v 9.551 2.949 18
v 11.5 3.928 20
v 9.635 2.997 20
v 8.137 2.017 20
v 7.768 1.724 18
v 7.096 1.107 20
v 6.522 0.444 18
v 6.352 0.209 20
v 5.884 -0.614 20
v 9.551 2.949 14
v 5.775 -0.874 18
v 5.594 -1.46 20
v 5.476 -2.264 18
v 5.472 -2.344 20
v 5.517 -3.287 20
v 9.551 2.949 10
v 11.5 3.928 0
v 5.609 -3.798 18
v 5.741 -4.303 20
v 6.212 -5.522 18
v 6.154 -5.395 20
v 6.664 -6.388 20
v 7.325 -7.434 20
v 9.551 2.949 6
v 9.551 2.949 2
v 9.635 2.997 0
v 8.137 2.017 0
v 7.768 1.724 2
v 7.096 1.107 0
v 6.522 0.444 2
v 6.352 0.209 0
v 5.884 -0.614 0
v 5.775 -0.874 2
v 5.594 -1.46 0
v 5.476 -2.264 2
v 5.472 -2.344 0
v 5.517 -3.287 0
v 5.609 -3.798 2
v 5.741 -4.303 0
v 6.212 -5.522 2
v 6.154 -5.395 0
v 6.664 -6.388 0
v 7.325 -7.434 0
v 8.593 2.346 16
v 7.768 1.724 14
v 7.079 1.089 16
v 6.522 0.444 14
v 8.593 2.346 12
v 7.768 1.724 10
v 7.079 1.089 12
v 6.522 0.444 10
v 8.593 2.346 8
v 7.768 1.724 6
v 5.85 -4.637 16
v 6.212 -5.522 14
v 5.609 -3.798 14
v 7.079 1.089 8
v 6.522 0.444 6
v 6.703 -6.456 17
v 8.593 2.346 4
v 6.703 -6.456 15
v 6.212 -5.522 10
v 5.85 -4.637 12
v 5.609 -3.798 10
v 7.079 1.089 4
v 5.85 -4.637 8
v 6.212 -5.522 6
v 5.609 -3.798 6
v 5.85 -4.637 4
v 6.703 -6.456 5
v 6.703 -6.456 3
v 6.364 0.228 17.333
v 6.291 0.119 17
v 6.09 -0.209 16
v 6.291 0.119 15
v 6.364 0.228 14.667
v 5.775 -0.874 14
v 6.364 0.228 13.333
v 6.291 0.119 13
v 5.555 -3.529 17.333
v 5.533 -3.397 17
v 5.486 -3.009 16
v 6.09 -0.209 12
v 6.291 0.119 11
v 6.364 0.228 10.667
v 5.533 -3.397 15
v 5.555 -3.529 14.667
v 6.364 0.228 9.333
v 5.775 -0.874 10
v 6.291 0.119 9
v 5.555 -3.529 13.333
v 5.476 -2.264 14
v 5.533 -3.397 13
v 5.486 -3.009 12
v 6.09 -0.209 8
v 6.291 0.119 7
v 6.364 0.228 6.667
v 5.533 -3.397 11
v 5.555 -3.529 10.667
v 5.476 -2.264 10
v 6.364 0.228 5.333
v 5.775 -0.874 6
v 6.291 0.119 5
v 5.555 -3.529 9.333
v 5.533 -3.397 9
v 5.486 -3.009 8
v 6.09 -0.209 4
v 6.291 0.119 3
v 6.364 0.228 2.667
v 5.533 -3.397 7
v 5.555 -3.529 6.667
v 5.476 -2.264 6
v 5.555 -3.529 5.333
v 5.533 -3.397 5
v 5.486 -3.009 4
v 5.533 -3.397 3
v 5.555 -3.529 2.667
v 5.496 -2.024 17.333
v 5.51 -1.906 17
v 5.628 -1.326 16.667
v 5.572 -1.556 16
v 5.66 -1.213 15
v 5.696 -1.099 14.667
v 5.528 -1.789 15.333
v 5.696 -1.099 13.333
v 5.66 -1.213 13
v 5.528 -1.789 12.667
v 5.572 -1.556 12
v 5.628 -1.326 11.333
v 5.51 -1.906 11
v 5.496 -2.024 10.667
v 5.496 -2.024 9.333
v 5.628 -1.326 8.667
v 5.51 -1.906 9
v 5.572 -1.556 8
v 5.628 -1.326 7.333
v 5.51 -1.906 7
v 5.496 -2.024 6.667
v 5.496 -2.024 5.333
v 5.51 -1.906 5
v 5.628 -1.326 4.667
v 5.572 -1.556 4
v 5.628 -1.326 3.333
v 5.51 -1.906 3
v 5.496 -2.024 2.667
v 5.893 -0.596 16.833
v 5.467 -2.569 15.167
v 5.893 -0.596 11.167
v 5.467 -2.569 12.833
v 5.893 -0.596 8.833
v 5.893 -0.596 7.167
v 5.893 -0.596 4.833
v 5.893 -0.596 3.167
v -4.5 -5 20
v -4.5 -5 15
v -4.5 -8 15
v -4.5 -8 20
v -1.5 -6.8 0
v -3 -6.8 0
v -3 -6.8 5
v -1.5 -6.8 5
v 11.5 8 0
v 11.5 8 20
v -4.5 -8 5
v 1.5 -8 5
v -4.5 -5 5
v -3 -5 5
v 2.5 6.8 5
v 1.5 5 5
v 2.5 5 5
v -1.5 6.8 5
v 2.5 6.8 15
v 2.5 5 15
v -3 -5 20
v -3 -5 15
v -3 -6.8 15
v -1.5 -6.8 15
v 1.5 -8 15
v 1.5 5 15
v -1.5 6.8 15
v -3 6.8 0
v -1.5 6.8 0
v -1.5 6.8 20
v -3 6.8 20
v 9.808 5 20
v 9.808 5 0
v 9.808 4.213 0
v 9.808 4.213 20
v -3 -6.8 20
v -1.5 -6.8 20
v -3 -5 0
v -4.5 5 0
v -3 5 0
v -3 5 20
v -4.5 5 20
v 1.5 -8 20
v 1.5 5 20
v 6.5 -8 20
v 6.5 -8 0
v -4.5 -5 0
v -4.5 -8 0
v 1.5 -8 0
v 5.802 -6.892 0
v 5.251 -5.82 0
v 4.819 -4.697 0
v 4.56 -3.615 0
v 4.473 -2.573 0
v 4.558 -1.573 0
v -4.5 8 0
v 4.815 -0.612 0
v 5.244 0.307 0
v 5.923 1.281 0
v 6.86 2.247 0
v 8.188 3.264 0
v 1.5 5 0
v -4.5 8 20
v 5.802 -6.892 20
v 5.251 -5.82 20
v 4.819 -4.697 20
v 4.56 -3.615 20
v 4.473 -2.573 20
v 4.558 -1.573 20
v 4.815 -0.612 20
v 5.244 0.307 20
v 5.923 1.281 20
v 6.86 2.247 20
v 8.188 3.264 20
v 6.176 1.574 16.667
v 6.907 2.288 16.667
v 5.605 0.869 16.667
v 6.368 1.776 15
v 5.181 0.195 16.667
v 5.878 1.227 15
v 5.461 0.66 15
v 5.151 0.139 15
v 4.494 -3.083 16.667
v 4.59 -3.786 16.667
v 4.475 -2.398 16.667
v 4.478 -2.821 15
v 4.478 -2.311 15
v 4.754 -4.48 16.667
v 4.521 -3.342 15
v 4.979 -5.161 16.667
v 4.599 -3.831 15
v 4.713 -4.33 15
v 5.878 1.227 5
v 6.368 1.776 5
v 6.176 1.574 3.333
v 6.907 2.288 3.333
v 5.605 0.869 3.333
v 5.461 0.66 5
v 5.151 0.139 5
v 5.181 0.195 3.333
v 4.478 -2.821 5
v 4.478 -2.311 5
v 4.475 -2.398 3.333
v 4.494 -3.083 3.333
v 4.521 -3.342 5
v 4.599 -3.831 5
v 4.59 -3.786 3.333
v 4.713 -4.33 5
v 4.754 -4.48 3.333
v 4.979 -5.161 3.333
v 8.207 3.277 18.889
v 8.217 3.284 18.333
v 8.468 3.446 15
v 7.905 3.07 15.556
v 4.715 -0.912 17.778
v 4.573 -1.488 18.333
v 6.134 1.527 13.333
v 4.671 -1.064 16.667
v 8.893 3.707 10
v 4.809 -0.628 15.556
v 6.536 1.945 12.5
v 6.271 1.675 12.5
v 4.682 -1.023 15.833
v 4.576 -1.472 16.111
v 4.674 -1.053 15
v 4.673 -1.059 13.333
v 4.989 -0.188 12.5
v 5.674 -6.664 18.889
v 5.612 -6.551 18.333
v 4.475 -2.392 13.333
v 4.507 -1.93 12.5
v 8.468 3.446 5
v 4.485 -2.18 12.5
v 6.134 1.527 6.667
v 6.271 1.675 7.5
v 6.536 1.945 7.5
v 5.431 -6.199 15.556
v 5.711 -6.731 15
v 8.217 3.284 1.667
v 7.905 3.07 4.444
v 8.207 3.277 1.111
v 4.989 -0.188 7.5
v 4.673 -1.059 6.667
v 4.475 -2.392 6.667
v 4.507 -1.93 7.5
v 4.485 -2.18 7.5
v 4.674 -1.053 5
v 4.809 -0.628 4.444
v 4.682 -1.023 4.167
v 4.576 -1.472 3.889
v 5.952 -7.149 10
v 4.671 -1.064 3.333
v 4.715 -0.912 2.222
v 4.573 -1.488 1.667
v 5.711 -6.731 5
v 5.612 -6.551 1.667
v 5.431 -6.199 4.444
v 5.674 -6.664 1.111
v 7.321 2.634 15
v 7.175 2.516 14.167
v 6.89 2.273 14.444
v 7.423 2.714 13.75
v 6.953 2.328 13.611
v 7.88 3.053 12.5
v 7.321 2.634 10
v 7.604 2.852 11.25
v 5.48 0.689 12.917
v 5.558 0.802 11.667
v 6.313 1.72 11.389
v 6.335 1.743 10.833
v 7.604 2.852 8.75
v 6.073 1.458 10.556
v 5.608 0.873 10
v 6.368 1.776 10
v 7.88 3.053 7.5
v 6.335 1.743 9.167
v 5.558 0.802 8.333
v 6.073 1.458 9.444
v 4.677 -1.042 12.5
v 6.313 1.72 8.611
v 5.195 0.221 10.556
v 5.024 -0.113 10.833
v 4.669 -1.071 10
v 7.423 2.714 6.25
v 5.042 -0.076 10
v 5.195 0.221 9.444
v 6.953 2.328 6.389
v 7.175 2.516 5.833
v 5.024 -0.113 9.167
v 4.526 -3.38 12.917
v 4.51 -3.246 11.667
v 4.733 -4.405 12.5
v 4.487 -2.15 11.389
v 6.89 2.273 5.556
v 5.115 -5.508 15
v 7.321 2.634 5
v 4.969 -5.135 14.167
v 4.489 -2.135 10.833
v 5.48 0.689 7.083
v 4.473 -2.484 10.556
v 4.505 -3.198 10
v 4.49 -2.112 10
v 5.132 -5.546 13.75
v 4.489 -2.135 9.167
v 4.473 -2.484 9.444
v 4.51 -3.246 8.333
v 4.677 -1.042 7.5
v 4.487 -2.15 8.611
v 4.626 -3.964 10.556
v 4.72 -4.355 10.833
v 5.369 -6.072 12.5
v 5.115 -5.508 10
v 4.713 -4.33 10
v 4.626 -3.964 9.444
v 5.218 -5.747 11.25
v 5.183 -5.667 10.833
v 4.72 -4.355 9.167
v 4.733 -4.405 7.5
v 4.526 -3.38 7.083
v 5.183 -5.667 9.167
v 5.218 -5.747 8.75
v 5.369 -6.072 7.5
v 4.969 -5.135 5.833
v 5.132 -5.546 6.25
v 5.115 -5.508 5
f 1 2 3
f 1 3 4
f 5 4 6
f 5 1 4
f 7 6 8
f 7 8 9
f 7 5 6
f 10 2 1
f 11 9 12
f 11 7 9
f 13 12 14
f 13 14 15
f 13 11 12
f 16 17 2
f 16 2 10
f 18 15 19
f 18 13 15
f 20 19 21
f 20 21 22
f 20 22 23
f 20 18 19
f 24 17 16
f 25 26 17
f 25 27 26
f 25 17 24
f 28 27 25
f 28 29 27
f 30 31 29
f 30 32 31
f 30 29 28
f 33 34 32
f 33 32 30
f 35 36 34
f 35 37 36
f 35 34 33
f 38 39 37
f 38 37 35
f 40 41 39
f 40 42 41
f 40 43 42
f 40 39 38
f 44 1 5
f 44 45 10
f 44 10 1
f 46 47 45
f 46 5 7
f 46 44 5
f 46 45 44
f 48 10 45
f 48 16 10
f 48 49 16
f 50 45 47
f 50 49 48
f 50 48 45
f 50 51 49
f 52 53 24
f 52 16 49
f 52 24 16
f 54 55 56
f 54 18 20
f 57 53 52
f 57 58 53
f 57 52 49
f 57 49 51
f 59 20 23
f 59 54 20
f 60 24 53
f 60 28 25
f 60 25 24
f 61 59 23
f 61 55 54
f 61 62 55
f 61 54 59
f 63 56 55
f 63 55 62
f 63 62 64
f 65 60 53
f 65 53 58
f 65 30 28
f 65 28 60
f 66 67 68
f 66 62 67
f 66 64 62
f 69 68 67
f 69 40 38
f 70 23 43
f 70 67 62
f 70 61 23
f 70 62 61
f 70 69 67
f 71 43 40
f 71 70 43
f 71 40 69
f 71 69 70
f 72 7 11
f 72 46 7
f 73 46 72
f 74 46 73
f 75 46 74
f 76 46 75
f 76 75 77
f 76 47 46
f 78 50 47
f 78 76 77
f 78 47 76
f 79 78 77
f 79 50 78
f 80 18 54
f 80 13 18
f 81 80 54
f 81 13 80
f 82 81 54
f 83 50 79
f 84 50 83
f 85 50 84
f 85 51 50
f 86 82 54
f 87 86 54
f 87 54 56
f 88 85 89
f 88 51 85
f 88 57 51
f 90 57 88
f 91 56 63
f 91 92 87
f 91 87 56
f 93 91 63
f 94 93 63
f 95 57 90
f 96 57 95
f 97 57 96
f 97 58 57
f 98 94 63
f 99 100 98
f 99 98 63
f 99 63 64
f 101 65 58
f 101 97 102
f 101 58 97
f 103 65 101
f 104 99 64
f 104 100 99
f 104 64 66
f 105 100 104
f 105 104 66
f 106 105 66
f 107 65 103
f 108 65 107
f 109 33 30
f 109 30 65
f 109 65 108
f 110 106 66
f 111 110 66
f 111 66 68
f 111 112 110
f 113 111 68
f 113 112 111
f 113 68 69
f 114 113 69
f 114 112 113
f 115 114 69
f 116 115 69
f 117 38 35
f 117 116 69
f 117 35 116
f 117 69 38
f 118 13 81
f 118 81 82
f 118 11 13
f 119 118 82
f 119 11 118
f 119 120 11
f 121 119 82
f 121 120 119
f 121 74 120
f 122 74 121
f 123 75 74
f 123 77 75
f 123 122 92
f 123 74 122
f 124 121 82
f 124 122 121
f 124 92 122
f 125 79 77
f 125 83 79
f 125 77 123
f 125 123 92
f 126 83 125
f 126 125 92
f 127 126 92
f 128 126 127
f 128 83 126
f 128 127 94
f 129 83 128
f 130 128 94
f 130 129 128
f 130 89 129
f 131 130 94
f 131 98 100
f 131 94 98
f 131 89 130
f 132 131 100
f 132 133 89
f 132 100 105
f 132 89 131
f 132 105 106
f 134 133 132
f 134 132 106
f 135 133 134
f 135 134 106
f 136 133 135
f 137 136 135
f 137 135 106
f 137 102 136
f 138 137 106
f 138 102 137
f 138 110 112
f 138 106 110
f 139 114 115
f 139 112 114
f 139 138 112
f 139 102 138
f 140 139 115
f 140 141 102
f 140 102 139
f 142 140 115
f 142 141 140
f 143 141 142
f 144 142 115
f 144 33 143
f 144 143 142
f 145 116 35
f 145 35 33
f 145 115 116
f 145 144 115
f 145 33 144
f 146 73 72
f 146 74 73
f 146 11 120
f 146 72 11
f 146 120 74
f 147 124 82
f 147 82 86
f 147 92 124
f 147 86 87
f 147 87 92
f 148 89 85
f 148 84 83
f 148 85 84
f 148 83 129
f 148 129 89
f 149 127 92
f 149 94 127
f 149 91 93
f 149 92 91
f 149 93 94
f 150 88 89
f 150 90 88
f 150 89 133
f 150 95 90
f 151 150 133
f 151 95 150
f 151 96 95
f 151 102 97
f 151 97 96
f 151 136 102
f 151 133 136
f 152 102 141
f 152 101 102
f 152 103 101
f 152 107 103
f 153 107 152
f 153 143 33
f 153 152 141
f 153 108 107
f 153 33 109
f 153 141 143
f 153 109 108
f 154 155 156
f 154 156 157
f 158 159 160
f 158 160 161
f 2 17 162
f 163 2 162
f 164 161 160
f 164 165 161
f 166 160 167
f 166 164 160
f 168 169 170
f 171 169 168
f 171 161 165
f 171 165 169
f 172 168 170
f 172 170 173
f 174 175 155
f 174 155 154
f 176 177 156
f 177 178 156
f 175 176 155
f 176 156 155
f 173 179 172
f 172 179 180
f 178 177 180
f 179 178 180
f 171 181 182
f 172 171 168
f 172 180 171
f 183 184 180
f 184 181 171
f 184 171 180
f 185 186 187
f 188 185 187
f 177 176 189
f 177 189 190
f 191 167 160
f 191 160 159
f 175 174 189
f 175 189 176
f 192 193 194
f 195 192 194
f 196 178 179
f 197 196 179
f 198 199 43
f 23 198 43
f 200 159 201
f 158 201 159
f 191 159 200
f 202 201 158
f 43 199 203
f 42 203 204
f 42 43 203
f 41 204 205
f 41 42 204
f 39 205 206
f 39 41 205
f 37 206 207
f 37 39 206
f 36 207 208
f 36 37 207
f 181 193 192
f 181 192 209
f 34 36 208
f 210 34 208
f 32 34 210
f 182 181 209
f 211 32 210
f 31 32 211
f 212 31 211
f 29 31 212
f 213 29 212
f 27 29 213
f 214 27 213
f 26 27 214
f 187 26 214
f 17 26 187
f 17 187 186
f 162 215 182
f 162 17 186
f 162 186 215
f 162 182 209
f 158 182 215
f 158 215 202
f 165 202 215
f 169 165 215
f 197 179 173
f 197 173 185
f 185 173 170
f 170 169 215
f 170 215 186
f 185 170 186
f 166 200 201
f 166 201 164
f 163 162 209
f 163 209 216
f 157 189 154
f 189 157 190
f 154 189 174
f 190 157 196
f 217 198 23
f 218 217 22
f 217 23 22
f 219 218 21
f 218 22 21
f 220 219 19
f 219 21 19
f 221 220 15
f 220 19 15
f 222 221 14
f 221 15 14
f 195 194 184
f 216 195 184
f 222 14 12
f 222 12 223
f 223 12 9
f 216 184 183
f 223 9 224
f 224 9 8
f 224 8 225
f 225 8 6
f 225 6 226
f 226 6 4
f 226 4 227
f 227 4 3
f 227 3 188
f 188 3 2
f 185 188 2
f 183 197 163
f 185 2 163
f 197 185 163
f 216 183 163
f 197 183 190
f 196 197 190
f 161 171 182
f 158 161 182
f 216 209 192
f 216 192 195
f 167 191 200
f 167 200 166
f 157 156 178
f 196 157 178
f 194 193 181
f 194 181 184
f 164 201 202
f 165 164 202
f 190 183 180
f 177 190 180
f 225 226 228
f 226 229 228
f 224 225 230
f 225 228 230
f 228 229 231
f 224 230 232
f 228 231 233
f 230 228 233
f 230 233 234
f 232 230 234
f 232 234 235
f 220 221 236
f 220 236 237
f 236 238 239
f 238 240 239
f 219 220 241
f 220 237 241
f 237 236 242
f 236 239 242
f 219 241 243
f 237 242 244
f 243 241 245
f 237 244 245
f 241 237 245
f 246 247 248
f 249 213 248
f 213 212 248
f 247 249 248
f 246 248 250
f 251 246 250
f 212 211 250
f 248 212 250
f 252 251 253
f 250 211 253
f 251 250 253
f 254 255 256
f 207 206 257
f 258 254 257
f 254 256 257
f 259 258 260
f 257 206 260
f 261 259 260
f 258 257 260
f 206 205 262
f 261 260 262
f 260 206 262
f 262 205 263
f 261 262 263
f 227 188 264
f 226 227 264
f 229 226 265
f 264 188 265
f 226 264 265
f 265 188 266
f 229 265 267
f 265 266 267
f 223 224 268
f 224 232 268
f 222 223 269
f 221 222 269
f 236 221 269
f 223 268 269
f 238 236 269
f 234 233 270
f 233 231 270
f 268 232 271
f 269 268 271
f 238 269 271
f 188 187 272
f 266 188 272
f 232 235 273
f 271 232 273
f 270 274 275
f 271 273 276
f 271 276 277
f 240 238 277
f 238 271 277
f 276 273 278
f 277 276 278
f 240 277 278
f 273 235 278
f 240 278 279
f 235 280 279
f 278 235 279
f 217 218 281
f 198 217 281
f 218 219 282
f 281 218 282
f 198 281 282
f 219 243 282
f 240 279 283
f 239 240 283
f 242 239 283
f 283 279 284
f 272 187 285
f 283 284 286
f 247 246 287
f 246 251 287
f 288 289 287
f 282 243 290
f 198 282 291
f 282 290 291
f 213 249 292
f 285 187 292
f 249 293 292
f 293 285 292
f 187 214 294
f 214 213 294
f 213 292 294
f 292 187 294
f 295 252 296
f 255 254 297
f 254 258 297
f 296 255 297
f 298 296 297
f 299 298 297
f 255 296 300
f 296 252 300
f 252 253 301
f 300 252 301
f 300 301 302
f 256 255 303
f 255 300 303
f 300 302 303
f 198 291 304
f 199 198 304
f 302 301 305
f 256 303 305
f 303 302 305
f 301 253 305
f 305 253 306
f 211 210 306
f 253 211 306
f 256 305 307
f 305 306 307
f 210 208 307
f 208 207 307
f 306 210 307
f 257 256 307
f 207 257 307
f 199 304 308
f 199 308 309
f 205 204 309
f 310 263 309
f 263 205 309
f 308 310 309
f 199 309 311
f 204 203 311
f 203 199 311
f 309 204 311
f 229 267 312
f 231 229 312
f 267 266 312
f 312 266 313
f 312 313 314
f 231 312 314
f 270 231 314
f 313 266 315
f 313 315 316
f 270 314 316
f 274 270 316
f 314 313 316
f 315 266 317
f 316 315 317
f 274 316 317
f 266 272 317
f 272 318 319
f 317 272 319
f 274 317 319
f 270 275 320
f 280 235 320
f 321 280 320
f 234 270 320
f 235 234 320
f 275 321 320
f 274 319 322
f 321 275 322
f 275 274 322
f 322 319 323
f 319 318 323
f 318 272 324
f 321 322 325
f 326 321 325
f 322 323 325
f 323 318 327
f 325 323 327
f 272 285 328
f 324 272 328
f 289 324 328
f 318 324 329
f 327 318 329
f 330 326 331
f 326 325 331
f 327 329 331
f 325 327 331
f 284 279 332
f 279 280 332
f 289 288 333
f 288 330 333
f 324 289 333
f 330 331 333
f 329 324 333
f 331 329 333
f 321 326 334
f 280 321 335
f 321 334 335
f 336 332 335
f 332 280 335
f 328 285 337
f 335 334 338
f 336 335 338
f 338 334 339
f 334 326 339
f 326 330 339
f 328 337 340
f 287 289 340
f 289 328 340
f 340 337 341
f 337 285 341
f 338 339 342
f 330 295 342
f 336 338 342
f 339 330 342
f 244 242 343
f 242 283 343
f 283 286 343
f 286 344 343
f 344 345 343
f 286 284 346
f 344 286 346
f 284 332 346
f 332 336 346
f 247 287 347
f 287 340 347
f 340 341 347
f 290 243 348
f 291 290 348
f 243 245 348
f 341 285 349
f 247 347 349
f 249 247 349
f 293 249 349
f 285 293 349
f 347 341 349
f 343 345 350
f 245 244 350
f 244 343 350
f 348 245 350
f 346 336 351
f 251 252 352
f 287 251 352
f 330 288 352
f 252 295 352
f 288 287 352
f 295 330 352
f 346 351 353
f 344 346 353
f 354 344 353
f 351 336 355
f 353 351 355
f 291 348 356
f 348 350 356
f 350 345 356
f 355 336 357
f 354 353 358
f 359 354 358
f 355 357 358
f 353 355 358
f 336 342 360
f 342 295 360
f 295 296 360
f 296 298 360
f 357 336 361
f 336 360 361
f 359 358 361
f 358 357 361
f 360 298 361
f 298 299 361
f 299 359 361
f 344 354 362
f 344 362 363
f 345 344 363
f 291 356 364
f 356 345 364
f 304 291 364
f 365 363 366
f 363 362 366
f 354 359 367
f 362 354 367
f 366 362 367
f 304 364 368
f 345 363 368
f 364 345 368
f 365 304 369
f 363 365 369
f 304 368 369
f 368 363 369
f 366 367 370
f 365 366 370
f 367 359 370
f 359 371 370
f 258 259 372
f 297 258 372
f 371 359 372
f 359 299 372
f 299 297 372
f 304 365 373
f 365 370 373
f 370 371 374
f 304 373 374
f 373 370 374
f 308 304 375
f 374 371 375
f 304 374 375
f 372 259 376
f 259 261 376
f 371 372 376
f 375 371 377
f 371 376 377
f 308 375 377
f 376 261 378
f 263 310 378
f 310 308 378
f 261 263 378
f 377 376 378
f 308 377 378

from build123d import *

# Parameters (mm, degrees)
AUFSATZ_LINEAR_AUSTRAGEN1_DEPTH = 20
SKIZZE2_W                       = 20
SKIZZE2_H                       = 3
AUFSATZ_LINEAR_AUSTRAGEN2_DEPTH = 3
SKIZZE3_W                       = 1.5
SKIZZE3_H                       = 20
SCHNITT_LINEAR_AUSTRAGEN1_DEPTH = 1.8
SKIZZE4_W                       = 1.5
SKIZZE4_H                       = 20
SCHNITT_LINEAR_AUSTRAGEN2_DEPTH = 1.8
SKIZZE14_W                      = 10
SKIZZE14_H                      = 13.6
SCHNITT_LINEAR_AUSTRAGEN5_DEPTH = 4
SKIZZE15_W                      = 10
SKIZZE15_H                      = 3
SCHNITT_LINEAR_AUSTRAGEN6_DEPTH = 6


# Read off the part's stored shape, not the designer's step: Aufsatz-Linear austragen1
with BuildPart() as part:
    # Aufsatz-Linear austragen1 outline → Aufsatz-Linear austragen1 (new body)
    with BuildSketch(Plane.XY):
        with BuildLine():
            Line((9.808332267, 5), (9.808332267, 4.212574368))
            add(Edge.make_bspline(
                [(9.808332267, 4.212574368), (1.184205361, -0.248328273), (6.5, -8)],
                knots=[0.083691521, 0.083691521, 0.083691521, 1, 1, 1], degree=2))
            Line((6.5, -8), (7.324710859, -7.434445405))
            add(Edge.make_bspline(
                [(11.5, 3.928207011), (11.209820184, 3.80014068), (10.506924616, 3.473790212), (9.167508184, 2.759616852), (7.676014914, 1.732695654), (6.437995439, 0.449518828), (5.702276721, -0.864348189), (5.405604765, -2.23902291), (5.529123845, -3.763138416), (6.029994776, -5.206555772), (6.676958994, -6.441666188), (7.105896283, -7.115968485), (7.324710859, -7.434445405)],
                knots=[0.019043297, 0.019043297, 0.019043297, 0.019043297, 0.0625, 0.125, 0.25, 0.375, 0.5, 0.625, 0.75, 0.875, 0.9375, 1, 1, 1, 1], degree=3))
            Line((11.5, 3.928207011), (11.5, 8))
            Line((11.5, 8), (-1.5, 8))
            Line((-1.5, 8), (-1.5, -8))
            Line((-1.5, -8), (1.5, -8))
            Line((1.5, -8), (1.5, 5))
            Line((1.5, 5), (9.808332267, 5))
        make_face()
    extrude(amount=AUFSATZ_LINEAR_AUSTRAGEN1_DEPTH)

    # Skizze2 → Aufsatz-Linear austragen2 (add)
    with BuildSketch(Plane.ZY.offset(1.5)):
        with Locations((10, 6.5)):
            Rectangle(SKIZZE2_W, SKIZZE2_H)
        with Locations((10, -6.5)):
            Rectangle(SKIZZE2_W, SKIZZE2_H)
    extrude(amount=AUFSATZ_LINEAR_AUSTRAGEN2_DEPTH)

    # Skizze3 → Schnitt-Linear austragen1 (cut)
    with BuildSketch(Plane.XZ.offset(-5)):
        with Locations((-2.25, 10)):
            Rectangle(SKIZZE3_W, SKIZZE3_H)
    extrude(amount=-SCHNITT_LINEAR_AUSTRAGEN1_DEPTH, mode=Mode.SUBTRACT)

    # Skizze4 → Schnitt-Linear austragen2 (cut)
    with BuildSketch(Plane(origin=(0, -5, 0), x_dir=(1, 0, 0), z_dir=(0, 1, 0))):
        with Locations((-2.25, -10)):
            Rectangle(SKIZZE4_W, SKIZZE4_H)
    extrude(amount=-SCHNITT_LINEAR_AUSTRAGEN2_DEPTH, mode=Mode.SUBTRACT)

    # Skizze14 → Schnitt-Linear austragen5 (cut)
    with BuildSketch(Plane.ZY.offset(1.5)):
        with Locations((10, 0)):
            Rectangle(SKIZZE14_W, SKIZZE14_H)
    extrude(amount=-SCHNITT_LINEAR_AUSTRAGEN5_DEPTH, mode=Mode.SUBTRACT)

    # Skizze15 → Schnitt-Linear austragen6 (cut)
    with BuildSketch(Plane.ZY.offset(4.5)):
        with Locations((10, -6.5)):
            Rectangle(SKIZZE15_W, SKIZZE15_H)
    extrude(amount=-SCHNITT_LINEAR_AUSTRAGEN6_DEPTH, mode=Mode.SUBTRACT)


solid = part.part
